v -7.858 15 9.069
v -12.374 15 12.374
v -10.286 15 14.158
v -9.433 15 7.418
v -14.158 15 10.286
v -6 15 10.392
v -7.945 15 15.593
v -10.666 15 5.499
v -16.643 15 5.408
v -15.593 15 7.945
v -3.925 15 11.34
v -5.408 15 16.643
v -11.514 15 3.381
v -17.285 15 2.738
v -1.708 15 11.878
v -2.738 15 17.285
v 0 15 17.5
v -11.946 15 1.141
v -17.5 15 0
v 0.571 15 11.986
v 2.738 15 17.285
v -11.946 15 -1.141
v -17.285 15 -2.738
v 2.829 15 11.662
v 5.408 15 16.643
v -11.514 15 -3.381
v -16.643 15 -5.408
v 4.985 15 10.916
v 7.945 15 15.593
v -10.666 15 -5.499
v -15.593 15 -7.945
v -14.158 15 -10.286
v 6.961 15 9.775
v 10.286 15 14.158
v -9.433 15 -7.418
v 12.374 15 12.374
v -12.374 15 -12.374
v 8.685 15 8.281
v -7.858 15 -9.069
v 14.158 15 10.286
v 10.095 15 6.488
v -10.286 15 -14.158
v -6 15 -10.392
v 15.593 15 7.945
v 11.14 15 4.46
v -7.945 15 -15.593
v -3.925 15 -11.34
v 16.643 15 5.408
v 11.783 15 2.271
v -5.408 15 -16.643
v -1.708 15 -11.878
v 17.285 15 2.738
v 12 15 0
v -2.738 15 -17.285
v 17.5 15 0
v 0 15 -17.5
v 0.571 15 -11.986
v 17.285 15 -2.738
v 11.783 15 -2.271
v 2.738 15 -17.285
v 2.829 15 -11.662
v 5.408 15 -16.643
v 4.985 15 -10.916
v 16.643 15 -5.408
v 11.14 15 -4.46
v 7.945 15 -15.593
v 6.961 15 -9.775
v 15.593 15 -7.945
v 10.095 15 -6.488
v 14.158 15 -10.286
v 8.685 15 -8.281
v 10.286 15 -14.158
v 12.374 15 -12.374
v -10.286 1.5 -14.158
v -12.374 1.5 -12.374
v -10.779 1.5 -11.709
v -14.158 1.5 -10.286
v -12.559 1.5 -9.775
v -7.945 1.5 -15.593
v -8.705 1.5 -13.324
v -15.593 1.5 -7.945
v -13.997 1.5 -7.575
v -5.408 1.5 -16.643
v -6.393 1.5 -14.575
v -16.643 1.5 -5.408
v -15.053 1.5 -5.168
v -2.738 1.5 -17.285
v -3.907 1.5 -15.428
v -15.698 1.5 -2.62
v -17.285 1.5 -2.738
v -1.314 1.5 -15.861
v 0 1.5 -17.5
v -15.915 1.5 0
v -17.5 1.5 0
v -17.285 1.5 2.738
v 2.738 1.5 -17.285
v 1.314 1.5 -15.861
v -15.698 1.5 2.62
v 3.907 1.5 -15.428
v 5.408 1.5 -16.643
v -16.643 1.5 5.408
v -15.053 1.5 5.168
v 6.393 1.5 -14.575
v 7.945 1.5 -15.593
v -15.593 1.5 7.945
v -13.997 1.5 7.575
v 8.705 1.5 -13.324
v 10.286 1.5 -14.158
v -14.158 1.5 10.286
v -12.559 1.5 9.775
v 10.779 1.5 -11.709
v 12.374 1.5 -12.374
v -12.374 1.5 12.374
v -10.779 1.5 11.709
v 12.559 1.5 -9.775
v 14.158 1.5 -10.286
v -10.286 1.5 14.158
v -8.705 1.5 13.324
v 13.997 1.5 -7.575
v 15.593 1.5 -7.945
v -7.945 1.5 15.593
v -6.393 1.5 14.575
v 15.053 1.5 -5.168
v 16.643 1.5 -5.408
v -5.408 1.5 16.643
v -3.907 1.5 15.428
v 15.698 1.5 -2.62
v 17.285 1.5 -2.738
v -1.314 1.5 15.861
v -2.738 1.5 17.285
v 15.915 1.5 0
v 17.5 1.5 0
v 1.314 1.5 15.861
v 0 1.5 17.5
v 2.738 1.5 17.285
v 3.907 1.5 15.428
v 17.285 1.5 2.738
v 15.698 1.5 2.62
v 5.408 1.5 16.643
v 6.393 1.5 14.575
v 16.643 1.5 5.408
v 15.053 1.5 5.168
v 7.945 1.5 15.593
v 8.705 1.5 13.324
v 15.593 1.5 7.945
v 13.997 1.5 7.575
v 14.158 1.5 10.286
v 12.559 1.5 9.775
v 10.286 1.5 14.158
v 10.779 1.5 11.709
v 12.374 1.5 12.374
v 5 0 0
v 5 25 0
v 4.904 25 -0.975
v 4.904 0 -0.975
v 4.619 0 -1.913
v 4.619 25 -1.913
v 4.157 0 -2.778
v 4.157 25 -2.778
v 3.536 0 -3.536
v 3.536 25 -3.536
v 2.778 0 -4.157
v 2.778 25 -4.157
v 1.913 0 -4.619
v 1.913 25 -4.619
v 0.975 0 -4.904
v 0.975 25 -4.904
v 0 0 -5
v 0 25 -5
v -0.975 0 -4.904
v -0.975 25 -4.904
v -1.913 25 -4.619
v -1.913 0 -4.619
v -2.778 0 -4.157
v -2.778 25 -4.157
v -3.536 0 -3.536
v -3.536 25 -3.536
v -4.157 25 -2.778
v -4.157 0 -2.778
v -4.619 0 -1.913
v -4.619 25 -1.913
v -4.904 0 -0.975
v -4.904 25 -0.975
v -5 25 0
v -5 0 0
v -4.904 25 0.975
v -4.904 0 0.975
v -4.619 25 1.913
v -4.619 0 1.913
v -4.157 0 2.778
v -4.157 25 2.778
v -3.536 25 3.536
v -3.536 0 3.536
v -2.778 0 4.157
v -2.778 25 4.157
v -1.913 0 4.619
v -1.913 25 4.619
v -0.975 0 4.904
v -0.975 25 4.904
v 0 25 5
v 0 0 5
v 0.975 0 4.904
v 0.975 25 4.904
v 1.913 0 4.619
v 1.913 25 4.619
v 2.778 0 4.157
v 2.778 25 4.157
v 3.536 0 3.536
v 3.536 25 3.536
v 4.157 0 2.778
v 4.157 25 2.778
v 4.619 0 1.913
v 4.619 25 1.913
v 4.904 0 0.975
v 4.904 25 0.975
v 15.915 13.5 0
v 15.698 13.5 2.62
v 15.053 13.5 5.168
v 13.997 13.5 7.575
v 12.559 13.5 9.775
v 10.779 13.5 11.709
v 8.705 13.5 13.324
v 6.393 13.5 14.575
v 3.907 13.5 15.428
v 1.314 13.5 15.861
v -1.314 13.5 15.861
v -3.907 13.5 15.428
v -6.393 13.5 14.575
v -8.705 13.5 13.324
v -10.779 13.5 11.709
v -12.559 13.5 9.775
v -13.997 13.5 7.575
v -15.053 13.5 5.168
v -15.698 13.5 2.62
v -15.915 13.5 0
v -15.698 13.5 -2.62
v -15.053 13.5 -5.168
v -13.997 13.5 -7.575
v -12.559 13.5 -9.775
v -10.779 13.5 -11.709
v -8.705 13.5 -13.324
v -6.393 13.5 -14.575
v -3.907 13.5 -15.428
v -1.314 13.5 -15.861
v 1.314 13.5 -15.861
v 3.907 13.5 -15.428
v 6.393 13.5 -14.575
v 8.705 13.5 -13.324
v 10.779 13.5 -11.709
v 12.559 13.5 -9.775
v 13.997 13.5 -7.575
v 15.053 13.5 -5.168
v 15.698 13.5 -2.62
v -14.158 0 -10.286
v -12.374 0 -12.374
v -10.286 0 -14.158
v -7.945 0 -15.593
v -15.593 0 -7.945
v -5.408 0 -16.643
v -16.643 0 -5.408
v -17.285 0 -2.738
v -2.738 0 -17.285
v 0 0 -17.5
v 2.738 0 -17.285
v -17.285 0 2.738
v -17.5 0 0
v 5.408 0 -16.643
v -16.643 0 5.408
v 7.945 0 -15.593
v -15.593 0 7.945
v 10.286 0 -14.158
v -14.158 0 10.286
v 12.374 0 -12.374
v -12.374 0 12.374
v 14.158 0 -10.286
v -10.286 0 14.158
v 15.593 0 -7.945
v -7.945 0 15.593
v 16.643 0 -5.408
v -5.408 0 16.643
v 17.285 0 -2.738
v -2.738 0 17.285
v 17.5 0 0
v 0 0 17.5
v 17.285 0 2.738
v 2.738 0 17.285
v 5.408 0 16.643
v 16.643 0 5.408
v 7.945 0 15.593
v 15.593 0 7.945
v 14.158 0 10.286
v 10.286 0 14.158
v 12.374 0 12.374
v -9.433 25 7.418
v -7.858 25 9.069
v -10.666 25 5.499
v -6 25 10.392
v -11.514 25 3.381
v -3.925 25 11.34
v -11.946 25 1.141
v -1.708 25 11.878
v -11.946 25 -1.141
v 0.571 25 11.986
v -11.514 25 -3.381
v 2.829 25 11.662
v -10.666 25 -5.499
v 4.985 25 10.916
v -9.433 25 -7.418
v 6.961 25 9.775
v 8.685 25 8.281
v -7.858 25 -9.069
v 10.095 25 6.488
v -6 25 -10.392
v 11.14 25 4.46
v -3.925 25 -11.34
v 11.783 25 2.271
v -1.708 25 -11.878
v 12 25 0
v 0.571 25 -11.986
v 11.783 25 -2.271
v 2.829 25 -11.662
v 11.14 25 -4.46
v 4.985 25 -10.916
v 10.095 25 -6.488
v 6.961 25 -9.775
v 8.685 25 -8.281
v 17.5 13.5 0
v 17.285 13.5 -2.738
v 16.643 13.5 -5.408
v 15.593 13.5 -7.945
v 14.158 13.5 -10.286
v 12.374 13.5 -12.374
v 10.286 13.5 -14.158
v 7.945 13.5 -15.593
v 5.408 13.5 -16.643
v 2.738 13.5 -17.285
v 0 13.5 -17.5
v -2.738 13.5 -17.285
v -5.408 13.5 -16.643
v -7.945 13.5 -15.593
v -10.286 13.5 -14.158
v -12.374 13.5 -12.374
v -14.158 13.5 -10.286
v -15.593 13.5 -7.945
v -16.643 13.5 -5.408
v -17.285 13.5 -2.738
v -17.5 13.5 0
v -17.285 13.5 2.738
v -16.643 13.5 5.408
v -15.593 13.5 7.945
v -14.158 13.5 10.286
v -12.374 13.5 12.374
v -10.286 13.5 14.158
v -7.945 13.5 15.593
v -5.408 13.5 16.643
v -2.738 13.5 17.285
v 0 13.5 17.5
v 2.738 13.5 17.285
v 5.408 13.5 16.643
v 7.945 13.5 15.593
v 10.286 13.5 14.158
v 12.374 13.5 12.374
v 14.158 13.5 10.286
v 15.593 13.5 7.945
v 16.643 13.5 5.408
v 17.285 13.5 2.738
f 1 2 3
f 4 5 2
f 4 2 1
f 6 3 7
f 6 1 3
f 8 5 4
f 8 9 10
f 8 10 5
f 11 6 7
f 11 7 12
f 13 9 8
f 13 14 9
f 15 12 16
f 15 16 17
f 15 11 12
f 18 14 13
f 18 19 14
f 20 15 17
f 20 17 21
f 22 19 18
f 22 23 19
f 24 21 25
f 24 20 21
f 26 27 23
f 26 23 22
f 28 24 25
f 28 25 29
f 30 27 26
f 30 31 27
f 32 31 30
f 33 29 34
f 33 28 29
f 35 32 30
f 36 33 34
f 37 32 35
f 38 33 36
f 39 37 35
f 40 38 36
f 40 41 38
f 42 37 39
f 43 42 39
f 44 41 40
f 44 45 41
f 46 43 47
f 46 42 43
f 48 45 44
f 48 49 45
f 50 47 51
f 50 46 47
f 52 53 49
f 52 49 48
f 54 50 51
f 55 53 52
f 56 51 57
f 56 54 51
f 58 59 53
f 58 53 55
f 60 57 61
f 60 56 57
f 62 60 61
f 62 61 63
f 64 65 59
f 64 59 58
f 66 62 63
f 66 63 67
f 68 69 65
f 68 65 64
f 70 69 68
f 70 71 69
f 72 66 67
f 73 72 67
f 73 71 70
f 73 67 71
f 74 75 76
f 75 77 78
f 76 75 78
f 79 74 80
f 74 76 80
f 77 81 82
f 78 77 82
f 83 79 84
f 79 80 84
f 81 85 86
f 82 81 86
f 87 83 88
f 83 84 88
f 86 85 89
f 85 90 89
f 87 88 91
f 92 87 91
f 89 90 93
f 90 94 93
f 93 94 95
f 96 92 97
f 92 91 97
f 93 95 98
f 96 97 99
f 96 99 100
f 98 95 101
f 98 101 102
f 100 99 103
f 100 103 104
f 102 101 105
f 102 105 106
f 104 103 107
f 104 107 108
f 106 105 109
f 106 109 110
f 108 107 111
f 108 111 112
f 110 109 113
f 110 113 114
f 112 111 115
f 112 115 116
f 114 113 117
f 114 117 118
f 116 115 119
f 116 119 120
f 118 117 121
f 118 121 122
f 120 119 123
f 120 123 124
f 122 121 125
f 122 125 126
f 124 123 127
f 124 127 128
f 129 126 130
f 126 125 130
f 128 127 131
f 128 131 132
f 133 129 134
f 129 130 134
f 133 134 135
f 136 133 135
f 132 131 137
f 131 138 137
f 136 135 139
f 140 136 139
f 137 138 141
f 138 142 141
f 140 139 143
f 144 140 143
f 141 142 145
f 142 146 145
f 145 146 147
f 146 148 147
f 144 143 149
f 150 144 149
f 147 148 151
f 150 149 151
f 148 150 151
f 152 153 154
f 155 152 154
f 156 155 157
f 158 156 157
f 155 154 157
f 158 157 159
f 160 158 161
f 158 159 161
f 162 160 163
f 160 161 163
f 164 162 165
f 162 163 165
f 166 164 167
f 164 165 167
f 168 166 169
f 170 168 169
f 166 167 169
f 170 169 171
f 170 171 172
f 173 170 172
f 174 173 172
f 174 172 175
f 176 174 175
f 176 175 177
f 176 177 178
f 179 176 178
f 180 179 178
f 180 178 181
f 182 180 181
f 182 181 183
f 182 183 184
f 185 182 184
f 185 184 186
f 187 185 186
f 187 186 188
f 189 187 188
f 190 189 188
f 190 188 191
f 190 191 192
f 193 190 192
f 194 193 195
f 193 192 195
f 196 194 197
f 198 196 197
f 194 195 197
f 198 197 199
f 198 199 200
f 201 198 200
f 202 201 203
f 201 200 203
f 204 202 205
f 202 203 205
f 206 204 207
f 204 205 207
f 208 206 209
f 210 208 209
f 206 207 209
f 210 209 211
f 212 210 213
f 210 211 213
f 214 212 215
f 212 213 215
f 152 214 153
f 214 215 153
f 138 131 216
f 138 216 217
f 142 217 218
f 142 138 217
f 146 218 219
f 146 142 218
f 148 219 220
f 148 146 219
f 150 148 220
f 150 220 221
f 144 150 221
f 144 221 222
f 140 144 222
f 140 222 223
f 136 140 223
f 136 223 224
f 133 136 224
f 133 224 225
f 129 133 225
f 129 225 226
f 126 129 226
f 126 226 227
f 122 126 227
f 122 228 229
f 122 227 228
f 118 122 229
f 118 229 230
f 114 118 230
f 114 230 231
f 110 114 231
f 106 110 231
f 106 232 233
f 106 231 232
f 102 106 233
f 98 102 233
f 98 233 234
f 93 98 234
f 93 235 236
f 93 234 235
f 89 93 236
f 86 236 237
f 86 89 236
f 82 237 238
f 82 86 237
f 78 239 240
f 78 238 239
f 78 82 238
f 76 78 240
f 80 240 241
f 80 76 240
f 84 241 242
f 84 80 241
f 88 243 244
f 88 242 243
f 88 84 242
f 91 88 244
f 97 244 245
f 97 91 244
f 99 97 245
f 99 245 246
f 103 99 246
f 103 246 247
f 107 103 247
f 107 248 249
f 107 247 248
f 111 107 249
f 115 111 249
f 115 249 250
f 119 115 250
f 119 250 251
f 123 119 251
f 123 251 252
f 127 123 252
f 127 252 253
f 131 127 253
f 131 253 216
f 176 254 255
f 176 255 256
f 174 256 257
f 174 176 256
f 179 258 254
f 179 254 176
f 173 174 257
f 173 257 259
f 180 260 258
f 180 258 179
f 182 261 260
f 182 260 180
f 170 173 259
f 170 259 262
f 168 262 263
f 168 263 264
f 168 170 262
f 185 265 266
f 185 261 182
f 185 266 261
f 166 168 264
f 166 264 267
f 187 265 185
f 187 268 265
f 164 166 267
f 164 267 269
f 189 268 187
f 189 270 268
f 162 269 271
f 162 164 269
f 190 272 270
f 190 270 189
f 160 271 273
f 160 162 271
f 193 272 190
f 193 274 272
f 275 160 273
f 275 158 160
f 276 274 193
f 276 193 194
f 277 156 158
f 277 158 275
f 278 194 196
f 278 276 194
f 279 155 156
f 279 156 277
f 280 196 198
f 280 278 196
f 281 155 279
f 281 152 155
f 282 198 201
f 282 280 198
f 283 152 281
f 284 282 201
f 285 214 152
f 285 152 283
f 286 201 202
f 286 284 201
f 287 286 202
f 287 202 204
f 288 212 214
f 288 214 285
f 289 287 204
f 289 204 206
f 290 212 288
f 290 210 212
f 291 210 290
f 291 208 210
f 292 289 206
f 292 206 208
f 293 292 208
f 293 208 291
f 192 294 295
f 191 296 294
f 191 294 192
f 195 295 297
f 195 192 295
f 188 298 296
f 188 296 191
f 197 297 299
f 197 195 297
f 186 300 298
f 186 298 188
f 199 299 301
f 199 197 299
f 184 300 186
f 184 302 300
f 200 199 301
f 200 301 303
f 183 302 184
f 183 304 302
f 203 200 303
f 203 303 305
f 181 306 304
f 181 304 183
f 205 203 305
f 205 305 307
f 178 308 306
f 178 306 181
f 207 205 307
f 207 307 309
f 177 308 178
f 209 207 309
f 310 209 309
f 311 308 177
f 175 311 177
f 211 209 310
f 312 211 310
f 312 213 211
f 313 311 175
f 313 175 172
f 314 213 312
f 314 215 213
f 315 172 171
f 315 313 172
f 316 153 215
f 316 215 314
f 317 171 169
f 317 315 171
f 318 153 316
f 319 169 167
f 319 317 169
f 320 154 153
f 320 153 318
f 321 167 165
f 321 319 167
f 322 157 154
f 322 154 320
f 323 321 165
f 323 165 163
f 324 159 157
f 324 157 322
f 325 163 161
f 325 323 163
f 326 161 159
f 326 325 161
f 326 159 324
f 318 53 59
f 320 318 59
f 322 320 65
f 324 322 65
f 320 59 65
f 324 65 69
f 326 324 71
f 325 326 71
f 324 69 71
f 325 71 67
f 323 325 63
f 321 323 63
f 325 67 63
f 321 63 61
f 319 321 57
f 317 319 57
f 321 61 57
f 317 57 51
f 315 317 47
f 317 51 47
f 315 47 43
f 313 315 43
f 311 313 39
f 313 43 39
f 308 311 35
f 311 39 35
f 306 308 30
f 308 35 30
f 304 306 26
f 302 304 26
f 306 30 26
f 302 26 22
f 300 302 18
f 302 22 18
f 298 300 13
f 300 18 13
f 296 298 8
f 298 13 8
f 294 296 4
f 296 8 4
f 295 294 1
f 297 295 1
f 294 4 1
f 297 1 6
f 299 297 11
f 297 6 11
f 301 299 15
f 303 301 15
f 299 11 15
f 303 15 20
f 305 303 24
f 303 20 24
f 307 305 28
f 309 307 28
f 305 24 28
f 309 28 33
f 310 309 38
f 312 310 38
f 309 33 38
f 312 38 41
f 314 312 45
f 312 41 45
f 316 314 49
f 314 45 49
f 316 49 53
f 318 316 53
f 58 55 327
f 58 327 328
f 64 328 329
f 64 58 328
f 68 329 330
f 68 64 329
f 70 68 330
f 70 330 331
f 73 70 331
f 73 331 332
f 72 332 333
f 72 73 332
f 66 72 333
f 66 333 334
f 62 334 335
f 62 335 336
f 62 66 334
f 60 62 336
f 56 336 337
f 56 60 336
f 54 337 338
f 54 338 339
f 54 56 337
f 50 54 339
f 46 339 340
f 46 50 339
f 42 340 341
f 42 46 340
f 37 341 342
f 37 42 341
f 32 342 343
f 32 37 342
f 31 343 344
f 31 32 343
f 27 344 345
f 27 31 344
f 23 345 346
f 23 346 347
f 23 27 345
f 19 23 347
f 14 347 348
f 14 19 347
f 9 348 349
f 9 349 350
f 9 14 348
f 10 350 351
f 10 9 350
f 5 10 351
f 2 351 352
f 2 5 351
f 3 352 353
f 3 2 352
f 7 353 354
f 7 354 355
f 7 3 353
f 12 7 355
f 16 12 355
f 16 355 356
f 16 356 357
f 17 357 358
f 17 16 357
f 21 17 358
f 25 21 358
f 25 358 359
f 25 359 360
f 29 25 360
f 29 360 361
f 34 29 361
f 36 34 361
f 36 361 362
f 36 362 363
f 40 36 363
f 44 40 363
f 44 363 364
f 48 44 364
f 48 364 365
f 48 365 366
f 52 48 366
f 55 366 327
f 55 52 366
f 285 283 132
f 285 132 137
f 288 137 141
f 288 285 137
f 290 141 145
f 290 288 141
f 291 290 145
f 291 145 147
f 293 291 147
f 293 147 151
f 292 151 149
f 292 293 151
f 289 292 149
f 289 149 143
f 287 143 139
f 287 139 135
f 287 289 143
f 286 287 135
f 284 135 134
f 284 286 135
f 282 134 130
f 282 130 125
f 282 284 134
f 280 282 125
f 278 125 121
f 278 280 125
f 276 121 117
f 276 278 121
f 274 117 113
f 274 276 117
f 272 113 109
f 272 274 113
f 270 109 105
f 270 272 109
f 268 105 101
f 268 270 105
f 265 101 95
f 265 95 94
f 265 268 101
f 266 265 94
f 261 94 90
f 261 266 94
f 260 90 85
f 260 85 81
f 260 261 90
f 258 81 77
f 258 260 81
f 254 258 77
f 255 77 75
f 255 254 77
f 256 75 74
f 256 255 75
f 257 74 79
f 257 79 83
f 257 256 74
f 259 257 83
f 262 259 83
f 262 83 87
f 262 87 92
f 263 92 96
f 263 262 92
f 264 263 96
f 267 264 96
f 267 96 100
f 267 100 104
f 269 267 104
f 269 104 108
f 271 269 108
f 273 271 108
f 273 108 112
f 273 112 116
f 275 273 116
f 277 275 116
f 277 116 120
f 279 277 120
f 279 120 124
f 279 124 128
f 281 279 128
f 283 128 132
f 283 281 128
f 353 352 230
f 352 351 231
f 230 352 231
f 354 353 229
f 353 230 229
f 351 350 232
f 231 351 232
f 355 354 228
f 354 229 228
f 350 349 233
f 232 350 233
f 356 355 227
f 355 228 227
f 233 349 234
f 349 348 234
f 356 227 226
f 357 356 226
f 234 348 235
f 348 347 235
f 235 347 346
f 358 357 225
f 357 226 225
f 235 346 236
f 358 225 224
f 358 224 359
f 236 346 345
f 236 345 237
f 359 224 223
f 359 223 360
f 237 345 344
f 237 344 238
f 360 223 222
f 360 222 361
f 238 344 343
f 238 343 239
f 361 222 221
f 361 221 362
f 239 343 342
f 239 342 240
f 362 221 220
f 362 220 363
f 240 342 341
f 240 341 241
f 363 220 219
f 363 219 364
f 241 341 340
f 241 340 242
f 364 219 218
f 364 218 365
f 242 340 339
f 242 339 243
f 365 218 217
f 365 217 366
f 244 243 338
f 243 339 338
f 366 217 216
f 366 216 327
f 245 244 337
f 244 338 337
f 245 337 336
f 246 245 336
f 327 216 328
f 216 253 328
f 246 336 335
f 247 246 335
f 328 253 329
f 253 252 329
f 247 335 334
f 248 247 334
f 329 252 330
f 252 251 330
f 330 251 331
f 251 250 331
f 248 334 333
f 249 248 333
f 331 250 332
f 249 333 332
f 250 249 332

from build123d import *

# Parameters (mm, degrees)
SKETCH1_R           = 32.34
BOSS_EXTRUDE1_DEPTH = 15
SKETCH2_R           = 12
BOSS_EXTRUDE2_DEPTH = 10
SKETCH3_R           = 5
CUT_EXTRUDE1_DEPTH  = 26
SKETCH4_R           = 32.34
SKETCH4_R_2         = 15.915
CUT_EXTRUDE3_DEPTH  = 15
SKETCH5_R           = 17.5
SKETCH5_R_2         = 15.915
BOSS_EXTRUDE3_DEPTH = 1.5
SKETCH6_R           = 17.5
SKETCH6_R_2         = 15.915
BOSS_EXTRUDE4_DEPTH = 1.5


with BuildPart() as part:
    # Sketch1 → Boss-Extrude1 (new body)
    with BuildSketch(Plane(origin=(0, 0, 0), x_dir=(1, 0, 0), z_dir=(0, 1, 0))):
        Circle(SKETCH1_R)
    extrude(amount=BOSS_EXTRUDE1_DEPTH)

    # Sketch2 → Boss-Extrude2 (add)
    with BuildSketch(Plane(origin=(0, 15, 0), x_dir=(1, 0, 0), z_dir=(0, 1, 0))):
        Circle(SKETCH2_R)
    extrude(amount=BOSS_EXTRUDE2_DEPTH)

    # Sketch3 → Cut-Extrude1 (cut)
    with BuildSketch(Plane(origin=(0, 25, 0), x_dir=(1, 0, 0), z_dir=(0, 1, 0))):
        Circle(SKETCH3_R)
    extrude(amount=-CUT_EXTRUDE1_DEPTH, mode=Mode.SUBTRACT)

    # Sketch4 → Cut-Extrude3 (cut)
    with BuildSketch(Plane.XZ):
        Circle(SKETCH4_R)
        Circle(SKETCH4_R_2, mode=Mode.SUBTRACT)
    extrude(amount=-CUT_EXTRUDE3_DEPTH, mode=Mode.SUBTRACT)

    # Sketch5 → Boss-Extrude3 (add)
    with BuildSketch(Plane.XZ):
        Circle(SKETCH5_R)
        Circle(SKETCH5_R_2, mode=Mode.SUBTRACT)
    extrude(amount=-BOSS_EXTRUDE3_DEPTH)

    # Sketch6 → Boss-Extrude4 (add)
    with BuildSketch(Plane(origin=(0, 15, 0), x_dir=(1, 0, 0), z_dir=(0, 1, 0))):
        Circle(SKETCH6_R)
        Circle(SKETCH6_R_2, mode=Mode.SUBTRACT)
    extrude(amount=-BOSS_EXTRUDE4_DEPTH)


solid = part.part
